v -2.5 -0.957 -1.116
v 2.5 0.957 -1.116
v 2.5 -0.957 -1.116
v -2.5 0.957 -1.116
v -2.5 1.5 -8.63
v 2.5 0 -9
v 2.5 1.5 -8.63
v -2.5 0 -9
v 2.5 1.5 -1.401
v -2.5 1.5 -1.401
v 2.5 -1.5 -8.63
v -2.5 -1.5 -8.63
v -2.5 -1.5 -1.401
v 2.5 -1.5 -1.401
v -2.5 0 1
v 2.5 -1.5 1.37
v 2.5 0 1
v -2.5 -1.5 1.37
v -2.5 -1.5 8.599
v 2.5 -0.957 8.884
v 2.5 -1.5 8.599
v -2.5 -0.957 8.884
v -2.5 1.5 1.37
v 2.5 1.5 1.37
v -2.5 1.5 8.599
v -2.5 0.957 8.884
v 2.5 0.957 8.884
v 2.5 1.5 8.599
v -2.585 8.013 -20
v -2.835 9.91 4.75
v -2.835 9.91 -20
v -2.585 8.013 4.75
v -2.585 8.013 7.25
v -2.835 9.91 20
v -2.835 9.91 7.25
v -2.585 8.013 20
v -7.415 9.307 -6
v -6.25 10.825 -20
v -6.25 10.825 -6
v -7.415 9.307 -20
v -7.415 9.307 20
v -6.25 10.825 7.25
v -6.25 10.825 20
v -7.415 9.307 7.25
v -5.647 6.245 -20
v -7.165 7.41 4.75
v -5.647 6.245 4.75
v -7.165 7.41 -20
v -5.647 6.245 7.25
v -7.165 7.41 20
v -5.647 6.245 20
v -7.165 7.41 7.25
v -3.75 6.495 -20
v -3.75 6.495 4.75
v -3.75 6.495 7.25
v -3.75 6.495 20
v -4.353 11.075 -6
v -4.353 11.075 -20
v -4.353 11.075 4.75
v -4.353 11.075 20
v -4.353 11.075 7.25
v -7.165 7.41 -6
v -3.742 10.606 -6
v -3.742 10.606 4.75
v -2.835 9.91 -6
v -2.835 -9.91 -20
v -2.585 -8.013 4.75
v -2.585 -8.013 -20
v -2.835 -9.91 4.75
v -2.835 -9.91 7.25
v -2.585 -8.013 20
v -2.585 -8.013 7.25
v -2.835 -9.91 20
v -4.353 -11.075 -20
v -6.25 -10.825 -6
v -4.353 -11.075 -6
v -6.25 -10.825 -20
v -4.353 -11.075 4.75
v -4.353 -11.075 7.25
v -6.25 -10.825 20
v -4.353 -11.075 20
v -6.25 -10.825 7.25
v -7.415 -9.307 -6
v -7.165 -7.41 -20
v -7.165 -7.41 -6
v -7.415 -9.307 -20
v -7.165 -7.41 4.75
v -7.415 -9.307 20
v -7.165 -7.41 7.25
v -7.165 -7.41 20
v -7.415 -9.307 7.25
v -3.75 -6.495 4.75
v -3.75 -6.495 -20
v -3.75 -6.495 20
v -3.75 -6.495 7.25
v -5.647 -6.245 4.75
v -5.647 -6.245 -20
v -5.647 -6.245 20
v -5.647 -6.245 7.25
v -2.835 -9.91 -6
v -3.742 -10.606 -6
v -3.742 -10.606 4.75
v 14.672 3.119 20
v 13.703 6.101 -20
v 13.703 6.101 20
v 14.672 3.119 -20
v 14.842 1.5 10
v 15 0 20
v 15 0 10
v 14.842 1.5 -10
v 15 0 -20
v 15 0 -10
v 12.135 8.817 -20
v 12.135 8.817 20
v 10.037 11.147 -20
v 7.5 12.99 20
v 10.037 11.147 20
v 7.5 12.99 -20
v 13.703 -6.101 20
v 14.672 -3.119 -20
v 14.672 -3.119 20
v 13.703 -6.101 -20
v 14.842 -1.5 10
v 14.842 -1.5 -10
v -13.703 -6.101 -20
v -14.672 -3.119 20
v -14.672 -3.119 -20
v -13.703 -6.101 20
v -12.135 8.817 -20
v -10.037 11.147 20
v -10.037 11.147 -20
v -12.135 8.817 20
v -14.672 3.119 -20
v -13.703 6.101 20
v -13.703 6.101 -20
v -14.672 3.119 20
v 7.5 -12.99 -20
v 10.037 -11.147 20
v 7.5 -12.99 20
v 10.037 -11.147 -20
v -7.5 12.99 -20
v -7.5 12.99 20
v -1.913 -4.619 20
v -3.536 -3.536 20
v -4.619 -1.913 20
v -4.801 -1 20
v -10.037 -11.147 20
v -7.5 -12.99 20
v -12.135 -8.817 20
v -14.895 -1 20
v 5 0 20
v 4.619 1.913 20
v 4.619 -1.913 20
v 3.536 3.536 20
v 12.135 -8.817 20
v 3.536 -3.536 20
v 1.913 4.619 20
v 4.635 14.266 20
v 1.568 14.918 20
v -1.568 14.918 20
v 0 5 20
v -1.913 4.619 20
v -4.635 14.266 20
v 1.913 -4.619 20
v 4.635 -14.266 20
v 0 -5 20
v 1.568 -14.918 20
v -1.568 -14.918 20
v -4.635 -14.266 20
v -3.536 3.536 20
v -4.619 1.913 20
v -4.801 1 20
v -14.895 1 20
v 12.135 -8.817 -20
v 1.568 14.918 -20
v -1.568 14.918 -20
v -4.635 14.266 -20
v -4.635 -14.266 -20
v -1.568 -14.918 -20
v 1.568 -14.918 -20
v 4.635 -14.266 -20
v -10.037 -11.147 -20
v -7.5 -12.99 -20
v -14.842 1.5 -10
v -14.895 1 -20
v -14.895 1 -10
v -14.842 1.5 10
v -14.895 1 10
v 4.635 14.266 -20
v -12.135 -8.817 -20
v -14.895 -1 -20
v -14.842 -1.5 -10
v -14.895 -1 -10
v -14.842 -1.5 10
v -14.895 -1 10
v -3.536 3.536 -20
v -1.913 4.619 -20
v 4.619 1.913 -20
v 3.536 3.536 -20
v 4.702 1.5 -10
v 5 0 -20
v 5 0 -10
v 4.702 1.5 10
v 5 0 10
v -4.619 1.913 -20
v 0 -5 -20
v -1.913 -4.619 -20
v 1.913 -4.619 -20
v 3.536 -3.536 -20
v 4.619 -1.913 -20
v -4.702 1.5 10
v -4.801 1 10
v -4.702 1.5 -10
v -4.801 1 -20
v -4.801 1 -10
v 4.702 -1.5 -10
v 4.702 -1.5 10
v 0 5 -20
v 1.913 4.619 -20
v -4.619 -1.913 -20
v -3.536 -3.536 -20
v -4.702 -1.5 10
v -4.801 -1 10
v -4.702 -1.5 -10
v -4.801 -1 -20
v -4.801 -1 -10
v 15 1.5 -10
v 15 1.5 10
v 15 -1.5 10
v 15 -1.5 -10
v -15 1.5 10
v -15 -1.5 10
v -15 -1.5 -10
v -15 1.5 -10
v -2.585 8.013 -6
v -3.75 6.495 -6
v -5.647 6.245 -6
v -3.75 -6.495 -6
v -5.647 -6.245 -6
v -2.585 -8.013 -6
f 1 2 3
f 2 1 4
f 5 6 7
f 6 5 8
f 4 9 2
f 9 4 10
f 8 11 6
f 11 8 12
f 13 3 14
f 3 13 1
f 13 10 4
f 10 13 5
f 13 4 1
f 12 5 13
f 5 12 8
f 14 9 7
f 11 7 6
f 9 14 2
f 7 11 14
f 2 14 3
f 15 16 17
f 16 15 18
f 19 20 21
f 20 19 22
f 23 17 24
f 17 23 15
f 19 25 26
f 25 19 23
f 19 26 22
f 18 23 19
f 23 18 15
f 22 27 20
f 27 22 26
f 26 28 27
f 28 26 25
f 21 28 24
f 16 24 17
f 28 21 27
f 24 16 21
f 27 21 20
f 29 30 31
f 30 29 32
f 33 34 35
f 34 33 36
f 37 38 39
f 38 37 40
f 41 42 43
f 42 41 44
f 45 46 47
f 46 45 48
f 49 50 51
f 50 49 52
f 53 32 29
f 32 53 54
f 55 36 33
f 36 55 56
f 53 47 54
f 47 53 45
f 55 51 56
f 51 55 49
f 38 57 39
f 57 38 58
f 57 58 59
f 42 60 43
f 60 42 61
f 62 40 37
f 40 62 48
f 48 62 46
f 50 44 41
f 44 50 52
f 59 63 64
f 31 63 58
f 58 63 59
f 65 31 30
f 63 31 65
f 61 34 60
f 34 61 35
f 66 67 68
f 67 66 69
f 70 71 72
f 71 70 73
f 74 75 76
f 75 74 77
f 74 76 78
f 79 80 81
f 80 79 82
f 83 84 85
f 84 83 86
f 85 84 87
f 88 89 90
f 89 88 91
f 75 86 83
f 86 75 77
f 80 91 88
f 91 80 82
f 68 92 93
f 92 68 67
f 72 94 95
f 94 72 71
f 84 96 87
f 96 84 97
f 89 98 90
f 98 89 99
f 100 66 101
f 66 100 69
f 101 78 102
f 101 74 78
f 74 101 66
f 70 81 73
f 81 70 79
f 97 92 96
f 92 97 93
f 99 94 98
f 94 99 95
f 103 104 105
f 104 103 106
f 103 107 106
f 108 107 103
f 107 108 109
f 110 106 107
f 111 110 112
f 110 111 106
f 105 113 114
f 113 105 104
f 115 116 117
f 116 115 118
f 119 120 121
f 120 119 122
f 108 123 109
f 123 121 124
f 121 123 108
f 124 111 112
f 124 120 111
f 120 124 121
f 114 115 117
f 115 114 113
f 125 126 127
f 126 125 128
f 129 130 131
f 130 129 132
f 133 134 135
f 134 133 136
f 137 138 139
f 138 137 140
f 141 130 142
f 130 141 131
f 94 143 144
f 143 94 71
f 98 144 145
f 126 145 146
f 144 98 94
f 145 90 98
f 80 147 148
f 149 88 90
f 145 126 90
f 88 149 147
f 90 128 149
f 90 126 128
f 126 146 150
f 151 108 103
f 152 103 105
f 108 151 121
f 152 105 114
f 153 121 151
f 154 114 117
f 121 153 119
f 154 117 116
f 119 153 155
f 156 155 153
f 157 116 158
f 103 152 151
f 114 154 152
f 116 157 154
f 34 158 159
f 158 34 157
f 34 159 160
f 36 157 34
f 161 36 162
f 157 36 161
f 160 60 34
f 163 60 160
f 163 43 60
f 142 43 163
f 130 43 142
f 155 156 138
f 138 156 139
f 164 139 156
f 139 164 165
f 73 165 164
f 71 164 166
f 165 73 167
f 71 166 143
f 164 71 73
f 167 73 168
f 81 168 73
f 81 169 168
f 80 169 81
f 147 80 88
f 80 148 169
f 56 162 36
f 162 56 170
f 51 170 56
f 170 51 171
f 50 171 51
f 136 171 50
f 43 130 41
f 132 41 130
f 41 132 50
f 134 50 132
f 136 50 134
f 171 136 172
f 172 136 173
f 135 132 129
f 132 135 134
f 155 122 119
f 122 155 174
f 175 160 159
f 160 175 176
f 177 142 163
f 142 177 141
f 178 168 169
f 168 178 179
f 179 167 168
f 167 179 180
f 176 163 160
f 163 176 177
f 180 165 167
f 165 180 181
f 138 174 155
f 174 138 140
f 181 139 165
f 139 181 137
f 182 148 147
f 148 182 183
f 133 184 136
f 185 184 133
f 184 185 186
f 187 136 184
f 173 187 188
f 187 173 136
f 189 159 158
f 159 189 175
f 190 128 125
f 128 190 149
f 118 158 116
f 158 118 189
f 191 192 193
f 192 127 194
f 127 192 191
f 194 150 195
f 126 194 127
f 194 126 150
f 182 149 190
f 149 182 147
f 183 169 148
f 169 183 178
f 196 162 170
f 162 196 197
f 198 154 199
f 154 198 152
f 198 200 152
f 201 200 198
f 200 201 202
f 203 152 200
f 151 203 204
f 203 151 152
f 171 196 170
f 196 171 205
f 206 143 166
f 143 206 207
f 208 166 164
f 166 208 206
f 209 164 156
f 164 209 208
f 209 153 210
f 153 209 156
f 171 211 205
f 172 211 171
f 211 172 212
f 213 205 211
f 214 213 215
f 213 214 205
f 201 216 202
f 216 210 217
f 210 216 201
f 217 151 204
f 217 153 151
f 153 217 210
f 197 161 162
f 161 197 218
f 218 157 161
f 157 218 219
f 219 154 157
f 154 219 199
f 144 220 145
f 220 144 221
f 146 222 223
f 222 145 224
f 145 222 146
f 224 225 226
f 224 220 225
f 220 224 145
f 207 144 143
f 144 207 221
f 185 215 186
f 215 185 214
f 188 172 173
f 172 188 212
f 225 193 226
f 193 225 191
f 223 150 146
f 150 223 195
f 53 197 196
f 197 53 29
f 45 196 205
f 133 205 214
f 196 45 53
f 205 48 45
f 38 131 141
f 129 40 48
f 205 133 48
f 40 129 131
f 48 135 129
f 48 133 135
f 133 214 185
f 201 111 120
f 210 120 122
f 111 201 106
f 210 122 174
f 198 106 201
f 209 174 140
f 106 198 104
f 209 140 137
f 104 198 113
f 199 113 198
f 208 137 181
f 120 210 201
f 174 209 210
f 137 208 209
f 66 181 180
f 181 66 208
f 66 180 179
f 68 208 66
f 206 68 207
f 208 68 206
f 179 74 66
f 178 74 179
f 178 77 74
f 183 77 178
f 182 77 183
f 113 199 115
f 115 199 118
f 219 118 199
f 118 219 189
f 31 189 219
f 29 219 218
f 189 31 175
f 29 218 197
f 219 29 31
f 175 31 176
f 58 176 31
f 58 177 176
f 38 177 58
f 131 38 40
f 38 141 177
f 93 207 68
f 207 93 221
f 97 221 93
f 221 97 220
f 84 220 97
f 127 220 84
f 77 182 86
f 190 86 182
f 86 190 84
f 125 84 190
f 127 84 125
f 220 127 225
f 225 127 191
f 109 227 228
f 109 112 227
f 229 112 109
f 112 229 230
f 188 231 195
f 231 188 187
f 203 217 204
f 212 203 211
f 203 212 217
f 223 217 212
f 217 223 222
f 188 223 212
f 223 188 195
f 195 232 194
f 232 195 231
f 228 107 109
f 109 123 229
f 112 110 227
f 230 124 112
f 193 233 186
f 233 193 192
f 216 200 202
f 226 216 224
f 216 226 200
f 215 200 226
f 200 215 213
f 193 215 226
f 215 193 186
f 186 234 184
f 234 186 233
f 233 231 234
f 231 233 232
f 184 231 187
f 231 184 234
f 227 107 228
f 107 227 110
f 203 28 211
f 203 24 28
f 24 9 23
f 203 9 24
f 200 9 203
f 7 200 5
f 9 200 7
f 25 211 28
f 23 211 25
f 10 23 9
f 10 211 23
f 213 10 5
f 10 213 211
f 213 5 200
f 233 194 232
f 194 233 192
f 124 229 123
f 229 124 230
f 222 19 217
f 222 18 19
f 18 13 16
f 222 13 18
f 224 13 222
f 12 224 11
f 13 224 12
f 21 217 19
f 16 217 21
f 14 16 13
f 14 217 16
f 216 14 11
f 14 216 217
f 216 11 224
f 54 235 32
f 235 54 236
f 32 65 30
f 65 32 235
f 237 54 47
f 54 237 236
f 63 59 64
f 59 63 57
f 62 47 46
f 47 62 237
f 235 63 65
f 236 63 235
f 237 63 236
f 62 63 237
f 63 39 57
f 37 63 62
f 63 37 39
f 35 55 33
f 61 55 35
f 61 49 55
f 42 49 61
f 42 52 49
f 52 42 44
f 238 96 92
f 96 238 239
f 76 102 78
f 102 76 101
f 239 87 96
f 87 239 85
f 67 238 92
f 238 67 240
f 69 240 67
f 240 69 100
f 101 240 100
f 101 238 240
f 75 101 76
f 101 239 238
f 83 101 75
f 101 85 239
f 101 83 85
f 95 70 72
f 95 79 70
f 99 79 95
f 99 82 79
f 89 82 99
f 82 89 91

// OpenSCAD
// Parameters
clamp_diameter = 30;
clamp_length = 20;
shaft_hole_diameter = 10;
fastener_hole_diameter = 5;
fastener_hole_offset = 10;
slit_width = 2; // Adjusted slit width for better flexibility
cutout_depth = 5;
cutout_width = 8;
flexible_element_thickness = 3;
screw_head_diameter = 8;
screw_length = 12;
groove_depth = 3;
groove_width = 5;
threaded_hole_diameter = 4.5; // Added threaded hole diameter

// Module for a single clamping half
module clamping_half() {
    difference() {
        // Main cylindrical body
        cylinder(d=clamp_diameter, h=clamp_length, center=true);
        
        // Shaft hole
        cylinder(d=shaft_hole_diameter, h=clamp_length+2, center=true);
        
        // Fastener holes
        for (angle = [120, 240]) {
            rotate([0, 0, angle])
                translate([fastener_hole_offset, 0, 0])
                cylinder(d=fastener_hole_diameter, h=clamp_length+2, center=true);
        }
        
        // Slit for clamping action (adjusted width)
        translate([-clamp_diameter/2, 0, 0])
            cube([clamp_diameter, slit_width, clamp_length+2], center=true);
        
        // Side cutouts for flexible element
        for (z_offset = [-clamp_length/4, clamp_length/4]) {
            translate([0, 0, z_offset])
                rotate([0, 90, 0])
                cylinder(d=cutout_width, h=cutout_depth, center=true);
        }
        
        // Additional grooves for flexibility
        for (z_offset = [-clamp_length/3, clamp_length/3]) {
            translate([0, 0, z_offset])
                rotate([0, 90, 0])
                cylinder(d=groove_width, h=groove_depth, center=true);
        }
        
        // Threaded holes for fastening screws
        for (angle = [120, 240]) {
            rotate([0, 0, angle])
                translate([fastener_hole_offset, 0, 0])
                cylinder(d=threaded_hole_diameter, h=clamp_length+2, center=true);
        }
    }
}

// Module for the flexible element
module flexible_element() {
    difference() {
        // Main flexible insert
        cube([clamp_diameter, flexible_element_thickness, clamp_length], center=true);
        
        // Cutouts to fit into the clamping halves
        for (z_offset = [-clamp_length/4, clamp_length/4]) {
            translate([0, 0, z_offset])
                rotate([0, 90, 0])
                cylinder(d=cutout_width, h=cutout_depth, center=true);
        }
    }
}

// Module for fastening screws
module fastening_screw() {
    union() {
        // Screw body
        cylinder(d=fastener_hole_diameter, h=screw_length, center=true);
        
        // Screw head
        translate([0, 0, screw_length/2])
            cylinder(d=screw_head_diameter, h=fastener_hole_diameter/2, center=true);
    }
}

// Assemble the coupling
module flexible_coupling() {
    // Top clamping half
    translate([0, 0, clamp_length/2])
        clamping_half();
    
    // Bottom clamping half (mirrored)
    translate([0, 0, -clamp_length/2])
        mirror([0, 0, 1])
        clamping_half();
    
    // Flexible element
    flexible_element();
    
    // Fastening screws
    for (angle = [120, 240]) {
        rotate([0, 0, angle])
            translate([fastener_hole_offset, 0, 0])
            fastening_screw();
    }
}

// Render the model
flexible_coupling();
